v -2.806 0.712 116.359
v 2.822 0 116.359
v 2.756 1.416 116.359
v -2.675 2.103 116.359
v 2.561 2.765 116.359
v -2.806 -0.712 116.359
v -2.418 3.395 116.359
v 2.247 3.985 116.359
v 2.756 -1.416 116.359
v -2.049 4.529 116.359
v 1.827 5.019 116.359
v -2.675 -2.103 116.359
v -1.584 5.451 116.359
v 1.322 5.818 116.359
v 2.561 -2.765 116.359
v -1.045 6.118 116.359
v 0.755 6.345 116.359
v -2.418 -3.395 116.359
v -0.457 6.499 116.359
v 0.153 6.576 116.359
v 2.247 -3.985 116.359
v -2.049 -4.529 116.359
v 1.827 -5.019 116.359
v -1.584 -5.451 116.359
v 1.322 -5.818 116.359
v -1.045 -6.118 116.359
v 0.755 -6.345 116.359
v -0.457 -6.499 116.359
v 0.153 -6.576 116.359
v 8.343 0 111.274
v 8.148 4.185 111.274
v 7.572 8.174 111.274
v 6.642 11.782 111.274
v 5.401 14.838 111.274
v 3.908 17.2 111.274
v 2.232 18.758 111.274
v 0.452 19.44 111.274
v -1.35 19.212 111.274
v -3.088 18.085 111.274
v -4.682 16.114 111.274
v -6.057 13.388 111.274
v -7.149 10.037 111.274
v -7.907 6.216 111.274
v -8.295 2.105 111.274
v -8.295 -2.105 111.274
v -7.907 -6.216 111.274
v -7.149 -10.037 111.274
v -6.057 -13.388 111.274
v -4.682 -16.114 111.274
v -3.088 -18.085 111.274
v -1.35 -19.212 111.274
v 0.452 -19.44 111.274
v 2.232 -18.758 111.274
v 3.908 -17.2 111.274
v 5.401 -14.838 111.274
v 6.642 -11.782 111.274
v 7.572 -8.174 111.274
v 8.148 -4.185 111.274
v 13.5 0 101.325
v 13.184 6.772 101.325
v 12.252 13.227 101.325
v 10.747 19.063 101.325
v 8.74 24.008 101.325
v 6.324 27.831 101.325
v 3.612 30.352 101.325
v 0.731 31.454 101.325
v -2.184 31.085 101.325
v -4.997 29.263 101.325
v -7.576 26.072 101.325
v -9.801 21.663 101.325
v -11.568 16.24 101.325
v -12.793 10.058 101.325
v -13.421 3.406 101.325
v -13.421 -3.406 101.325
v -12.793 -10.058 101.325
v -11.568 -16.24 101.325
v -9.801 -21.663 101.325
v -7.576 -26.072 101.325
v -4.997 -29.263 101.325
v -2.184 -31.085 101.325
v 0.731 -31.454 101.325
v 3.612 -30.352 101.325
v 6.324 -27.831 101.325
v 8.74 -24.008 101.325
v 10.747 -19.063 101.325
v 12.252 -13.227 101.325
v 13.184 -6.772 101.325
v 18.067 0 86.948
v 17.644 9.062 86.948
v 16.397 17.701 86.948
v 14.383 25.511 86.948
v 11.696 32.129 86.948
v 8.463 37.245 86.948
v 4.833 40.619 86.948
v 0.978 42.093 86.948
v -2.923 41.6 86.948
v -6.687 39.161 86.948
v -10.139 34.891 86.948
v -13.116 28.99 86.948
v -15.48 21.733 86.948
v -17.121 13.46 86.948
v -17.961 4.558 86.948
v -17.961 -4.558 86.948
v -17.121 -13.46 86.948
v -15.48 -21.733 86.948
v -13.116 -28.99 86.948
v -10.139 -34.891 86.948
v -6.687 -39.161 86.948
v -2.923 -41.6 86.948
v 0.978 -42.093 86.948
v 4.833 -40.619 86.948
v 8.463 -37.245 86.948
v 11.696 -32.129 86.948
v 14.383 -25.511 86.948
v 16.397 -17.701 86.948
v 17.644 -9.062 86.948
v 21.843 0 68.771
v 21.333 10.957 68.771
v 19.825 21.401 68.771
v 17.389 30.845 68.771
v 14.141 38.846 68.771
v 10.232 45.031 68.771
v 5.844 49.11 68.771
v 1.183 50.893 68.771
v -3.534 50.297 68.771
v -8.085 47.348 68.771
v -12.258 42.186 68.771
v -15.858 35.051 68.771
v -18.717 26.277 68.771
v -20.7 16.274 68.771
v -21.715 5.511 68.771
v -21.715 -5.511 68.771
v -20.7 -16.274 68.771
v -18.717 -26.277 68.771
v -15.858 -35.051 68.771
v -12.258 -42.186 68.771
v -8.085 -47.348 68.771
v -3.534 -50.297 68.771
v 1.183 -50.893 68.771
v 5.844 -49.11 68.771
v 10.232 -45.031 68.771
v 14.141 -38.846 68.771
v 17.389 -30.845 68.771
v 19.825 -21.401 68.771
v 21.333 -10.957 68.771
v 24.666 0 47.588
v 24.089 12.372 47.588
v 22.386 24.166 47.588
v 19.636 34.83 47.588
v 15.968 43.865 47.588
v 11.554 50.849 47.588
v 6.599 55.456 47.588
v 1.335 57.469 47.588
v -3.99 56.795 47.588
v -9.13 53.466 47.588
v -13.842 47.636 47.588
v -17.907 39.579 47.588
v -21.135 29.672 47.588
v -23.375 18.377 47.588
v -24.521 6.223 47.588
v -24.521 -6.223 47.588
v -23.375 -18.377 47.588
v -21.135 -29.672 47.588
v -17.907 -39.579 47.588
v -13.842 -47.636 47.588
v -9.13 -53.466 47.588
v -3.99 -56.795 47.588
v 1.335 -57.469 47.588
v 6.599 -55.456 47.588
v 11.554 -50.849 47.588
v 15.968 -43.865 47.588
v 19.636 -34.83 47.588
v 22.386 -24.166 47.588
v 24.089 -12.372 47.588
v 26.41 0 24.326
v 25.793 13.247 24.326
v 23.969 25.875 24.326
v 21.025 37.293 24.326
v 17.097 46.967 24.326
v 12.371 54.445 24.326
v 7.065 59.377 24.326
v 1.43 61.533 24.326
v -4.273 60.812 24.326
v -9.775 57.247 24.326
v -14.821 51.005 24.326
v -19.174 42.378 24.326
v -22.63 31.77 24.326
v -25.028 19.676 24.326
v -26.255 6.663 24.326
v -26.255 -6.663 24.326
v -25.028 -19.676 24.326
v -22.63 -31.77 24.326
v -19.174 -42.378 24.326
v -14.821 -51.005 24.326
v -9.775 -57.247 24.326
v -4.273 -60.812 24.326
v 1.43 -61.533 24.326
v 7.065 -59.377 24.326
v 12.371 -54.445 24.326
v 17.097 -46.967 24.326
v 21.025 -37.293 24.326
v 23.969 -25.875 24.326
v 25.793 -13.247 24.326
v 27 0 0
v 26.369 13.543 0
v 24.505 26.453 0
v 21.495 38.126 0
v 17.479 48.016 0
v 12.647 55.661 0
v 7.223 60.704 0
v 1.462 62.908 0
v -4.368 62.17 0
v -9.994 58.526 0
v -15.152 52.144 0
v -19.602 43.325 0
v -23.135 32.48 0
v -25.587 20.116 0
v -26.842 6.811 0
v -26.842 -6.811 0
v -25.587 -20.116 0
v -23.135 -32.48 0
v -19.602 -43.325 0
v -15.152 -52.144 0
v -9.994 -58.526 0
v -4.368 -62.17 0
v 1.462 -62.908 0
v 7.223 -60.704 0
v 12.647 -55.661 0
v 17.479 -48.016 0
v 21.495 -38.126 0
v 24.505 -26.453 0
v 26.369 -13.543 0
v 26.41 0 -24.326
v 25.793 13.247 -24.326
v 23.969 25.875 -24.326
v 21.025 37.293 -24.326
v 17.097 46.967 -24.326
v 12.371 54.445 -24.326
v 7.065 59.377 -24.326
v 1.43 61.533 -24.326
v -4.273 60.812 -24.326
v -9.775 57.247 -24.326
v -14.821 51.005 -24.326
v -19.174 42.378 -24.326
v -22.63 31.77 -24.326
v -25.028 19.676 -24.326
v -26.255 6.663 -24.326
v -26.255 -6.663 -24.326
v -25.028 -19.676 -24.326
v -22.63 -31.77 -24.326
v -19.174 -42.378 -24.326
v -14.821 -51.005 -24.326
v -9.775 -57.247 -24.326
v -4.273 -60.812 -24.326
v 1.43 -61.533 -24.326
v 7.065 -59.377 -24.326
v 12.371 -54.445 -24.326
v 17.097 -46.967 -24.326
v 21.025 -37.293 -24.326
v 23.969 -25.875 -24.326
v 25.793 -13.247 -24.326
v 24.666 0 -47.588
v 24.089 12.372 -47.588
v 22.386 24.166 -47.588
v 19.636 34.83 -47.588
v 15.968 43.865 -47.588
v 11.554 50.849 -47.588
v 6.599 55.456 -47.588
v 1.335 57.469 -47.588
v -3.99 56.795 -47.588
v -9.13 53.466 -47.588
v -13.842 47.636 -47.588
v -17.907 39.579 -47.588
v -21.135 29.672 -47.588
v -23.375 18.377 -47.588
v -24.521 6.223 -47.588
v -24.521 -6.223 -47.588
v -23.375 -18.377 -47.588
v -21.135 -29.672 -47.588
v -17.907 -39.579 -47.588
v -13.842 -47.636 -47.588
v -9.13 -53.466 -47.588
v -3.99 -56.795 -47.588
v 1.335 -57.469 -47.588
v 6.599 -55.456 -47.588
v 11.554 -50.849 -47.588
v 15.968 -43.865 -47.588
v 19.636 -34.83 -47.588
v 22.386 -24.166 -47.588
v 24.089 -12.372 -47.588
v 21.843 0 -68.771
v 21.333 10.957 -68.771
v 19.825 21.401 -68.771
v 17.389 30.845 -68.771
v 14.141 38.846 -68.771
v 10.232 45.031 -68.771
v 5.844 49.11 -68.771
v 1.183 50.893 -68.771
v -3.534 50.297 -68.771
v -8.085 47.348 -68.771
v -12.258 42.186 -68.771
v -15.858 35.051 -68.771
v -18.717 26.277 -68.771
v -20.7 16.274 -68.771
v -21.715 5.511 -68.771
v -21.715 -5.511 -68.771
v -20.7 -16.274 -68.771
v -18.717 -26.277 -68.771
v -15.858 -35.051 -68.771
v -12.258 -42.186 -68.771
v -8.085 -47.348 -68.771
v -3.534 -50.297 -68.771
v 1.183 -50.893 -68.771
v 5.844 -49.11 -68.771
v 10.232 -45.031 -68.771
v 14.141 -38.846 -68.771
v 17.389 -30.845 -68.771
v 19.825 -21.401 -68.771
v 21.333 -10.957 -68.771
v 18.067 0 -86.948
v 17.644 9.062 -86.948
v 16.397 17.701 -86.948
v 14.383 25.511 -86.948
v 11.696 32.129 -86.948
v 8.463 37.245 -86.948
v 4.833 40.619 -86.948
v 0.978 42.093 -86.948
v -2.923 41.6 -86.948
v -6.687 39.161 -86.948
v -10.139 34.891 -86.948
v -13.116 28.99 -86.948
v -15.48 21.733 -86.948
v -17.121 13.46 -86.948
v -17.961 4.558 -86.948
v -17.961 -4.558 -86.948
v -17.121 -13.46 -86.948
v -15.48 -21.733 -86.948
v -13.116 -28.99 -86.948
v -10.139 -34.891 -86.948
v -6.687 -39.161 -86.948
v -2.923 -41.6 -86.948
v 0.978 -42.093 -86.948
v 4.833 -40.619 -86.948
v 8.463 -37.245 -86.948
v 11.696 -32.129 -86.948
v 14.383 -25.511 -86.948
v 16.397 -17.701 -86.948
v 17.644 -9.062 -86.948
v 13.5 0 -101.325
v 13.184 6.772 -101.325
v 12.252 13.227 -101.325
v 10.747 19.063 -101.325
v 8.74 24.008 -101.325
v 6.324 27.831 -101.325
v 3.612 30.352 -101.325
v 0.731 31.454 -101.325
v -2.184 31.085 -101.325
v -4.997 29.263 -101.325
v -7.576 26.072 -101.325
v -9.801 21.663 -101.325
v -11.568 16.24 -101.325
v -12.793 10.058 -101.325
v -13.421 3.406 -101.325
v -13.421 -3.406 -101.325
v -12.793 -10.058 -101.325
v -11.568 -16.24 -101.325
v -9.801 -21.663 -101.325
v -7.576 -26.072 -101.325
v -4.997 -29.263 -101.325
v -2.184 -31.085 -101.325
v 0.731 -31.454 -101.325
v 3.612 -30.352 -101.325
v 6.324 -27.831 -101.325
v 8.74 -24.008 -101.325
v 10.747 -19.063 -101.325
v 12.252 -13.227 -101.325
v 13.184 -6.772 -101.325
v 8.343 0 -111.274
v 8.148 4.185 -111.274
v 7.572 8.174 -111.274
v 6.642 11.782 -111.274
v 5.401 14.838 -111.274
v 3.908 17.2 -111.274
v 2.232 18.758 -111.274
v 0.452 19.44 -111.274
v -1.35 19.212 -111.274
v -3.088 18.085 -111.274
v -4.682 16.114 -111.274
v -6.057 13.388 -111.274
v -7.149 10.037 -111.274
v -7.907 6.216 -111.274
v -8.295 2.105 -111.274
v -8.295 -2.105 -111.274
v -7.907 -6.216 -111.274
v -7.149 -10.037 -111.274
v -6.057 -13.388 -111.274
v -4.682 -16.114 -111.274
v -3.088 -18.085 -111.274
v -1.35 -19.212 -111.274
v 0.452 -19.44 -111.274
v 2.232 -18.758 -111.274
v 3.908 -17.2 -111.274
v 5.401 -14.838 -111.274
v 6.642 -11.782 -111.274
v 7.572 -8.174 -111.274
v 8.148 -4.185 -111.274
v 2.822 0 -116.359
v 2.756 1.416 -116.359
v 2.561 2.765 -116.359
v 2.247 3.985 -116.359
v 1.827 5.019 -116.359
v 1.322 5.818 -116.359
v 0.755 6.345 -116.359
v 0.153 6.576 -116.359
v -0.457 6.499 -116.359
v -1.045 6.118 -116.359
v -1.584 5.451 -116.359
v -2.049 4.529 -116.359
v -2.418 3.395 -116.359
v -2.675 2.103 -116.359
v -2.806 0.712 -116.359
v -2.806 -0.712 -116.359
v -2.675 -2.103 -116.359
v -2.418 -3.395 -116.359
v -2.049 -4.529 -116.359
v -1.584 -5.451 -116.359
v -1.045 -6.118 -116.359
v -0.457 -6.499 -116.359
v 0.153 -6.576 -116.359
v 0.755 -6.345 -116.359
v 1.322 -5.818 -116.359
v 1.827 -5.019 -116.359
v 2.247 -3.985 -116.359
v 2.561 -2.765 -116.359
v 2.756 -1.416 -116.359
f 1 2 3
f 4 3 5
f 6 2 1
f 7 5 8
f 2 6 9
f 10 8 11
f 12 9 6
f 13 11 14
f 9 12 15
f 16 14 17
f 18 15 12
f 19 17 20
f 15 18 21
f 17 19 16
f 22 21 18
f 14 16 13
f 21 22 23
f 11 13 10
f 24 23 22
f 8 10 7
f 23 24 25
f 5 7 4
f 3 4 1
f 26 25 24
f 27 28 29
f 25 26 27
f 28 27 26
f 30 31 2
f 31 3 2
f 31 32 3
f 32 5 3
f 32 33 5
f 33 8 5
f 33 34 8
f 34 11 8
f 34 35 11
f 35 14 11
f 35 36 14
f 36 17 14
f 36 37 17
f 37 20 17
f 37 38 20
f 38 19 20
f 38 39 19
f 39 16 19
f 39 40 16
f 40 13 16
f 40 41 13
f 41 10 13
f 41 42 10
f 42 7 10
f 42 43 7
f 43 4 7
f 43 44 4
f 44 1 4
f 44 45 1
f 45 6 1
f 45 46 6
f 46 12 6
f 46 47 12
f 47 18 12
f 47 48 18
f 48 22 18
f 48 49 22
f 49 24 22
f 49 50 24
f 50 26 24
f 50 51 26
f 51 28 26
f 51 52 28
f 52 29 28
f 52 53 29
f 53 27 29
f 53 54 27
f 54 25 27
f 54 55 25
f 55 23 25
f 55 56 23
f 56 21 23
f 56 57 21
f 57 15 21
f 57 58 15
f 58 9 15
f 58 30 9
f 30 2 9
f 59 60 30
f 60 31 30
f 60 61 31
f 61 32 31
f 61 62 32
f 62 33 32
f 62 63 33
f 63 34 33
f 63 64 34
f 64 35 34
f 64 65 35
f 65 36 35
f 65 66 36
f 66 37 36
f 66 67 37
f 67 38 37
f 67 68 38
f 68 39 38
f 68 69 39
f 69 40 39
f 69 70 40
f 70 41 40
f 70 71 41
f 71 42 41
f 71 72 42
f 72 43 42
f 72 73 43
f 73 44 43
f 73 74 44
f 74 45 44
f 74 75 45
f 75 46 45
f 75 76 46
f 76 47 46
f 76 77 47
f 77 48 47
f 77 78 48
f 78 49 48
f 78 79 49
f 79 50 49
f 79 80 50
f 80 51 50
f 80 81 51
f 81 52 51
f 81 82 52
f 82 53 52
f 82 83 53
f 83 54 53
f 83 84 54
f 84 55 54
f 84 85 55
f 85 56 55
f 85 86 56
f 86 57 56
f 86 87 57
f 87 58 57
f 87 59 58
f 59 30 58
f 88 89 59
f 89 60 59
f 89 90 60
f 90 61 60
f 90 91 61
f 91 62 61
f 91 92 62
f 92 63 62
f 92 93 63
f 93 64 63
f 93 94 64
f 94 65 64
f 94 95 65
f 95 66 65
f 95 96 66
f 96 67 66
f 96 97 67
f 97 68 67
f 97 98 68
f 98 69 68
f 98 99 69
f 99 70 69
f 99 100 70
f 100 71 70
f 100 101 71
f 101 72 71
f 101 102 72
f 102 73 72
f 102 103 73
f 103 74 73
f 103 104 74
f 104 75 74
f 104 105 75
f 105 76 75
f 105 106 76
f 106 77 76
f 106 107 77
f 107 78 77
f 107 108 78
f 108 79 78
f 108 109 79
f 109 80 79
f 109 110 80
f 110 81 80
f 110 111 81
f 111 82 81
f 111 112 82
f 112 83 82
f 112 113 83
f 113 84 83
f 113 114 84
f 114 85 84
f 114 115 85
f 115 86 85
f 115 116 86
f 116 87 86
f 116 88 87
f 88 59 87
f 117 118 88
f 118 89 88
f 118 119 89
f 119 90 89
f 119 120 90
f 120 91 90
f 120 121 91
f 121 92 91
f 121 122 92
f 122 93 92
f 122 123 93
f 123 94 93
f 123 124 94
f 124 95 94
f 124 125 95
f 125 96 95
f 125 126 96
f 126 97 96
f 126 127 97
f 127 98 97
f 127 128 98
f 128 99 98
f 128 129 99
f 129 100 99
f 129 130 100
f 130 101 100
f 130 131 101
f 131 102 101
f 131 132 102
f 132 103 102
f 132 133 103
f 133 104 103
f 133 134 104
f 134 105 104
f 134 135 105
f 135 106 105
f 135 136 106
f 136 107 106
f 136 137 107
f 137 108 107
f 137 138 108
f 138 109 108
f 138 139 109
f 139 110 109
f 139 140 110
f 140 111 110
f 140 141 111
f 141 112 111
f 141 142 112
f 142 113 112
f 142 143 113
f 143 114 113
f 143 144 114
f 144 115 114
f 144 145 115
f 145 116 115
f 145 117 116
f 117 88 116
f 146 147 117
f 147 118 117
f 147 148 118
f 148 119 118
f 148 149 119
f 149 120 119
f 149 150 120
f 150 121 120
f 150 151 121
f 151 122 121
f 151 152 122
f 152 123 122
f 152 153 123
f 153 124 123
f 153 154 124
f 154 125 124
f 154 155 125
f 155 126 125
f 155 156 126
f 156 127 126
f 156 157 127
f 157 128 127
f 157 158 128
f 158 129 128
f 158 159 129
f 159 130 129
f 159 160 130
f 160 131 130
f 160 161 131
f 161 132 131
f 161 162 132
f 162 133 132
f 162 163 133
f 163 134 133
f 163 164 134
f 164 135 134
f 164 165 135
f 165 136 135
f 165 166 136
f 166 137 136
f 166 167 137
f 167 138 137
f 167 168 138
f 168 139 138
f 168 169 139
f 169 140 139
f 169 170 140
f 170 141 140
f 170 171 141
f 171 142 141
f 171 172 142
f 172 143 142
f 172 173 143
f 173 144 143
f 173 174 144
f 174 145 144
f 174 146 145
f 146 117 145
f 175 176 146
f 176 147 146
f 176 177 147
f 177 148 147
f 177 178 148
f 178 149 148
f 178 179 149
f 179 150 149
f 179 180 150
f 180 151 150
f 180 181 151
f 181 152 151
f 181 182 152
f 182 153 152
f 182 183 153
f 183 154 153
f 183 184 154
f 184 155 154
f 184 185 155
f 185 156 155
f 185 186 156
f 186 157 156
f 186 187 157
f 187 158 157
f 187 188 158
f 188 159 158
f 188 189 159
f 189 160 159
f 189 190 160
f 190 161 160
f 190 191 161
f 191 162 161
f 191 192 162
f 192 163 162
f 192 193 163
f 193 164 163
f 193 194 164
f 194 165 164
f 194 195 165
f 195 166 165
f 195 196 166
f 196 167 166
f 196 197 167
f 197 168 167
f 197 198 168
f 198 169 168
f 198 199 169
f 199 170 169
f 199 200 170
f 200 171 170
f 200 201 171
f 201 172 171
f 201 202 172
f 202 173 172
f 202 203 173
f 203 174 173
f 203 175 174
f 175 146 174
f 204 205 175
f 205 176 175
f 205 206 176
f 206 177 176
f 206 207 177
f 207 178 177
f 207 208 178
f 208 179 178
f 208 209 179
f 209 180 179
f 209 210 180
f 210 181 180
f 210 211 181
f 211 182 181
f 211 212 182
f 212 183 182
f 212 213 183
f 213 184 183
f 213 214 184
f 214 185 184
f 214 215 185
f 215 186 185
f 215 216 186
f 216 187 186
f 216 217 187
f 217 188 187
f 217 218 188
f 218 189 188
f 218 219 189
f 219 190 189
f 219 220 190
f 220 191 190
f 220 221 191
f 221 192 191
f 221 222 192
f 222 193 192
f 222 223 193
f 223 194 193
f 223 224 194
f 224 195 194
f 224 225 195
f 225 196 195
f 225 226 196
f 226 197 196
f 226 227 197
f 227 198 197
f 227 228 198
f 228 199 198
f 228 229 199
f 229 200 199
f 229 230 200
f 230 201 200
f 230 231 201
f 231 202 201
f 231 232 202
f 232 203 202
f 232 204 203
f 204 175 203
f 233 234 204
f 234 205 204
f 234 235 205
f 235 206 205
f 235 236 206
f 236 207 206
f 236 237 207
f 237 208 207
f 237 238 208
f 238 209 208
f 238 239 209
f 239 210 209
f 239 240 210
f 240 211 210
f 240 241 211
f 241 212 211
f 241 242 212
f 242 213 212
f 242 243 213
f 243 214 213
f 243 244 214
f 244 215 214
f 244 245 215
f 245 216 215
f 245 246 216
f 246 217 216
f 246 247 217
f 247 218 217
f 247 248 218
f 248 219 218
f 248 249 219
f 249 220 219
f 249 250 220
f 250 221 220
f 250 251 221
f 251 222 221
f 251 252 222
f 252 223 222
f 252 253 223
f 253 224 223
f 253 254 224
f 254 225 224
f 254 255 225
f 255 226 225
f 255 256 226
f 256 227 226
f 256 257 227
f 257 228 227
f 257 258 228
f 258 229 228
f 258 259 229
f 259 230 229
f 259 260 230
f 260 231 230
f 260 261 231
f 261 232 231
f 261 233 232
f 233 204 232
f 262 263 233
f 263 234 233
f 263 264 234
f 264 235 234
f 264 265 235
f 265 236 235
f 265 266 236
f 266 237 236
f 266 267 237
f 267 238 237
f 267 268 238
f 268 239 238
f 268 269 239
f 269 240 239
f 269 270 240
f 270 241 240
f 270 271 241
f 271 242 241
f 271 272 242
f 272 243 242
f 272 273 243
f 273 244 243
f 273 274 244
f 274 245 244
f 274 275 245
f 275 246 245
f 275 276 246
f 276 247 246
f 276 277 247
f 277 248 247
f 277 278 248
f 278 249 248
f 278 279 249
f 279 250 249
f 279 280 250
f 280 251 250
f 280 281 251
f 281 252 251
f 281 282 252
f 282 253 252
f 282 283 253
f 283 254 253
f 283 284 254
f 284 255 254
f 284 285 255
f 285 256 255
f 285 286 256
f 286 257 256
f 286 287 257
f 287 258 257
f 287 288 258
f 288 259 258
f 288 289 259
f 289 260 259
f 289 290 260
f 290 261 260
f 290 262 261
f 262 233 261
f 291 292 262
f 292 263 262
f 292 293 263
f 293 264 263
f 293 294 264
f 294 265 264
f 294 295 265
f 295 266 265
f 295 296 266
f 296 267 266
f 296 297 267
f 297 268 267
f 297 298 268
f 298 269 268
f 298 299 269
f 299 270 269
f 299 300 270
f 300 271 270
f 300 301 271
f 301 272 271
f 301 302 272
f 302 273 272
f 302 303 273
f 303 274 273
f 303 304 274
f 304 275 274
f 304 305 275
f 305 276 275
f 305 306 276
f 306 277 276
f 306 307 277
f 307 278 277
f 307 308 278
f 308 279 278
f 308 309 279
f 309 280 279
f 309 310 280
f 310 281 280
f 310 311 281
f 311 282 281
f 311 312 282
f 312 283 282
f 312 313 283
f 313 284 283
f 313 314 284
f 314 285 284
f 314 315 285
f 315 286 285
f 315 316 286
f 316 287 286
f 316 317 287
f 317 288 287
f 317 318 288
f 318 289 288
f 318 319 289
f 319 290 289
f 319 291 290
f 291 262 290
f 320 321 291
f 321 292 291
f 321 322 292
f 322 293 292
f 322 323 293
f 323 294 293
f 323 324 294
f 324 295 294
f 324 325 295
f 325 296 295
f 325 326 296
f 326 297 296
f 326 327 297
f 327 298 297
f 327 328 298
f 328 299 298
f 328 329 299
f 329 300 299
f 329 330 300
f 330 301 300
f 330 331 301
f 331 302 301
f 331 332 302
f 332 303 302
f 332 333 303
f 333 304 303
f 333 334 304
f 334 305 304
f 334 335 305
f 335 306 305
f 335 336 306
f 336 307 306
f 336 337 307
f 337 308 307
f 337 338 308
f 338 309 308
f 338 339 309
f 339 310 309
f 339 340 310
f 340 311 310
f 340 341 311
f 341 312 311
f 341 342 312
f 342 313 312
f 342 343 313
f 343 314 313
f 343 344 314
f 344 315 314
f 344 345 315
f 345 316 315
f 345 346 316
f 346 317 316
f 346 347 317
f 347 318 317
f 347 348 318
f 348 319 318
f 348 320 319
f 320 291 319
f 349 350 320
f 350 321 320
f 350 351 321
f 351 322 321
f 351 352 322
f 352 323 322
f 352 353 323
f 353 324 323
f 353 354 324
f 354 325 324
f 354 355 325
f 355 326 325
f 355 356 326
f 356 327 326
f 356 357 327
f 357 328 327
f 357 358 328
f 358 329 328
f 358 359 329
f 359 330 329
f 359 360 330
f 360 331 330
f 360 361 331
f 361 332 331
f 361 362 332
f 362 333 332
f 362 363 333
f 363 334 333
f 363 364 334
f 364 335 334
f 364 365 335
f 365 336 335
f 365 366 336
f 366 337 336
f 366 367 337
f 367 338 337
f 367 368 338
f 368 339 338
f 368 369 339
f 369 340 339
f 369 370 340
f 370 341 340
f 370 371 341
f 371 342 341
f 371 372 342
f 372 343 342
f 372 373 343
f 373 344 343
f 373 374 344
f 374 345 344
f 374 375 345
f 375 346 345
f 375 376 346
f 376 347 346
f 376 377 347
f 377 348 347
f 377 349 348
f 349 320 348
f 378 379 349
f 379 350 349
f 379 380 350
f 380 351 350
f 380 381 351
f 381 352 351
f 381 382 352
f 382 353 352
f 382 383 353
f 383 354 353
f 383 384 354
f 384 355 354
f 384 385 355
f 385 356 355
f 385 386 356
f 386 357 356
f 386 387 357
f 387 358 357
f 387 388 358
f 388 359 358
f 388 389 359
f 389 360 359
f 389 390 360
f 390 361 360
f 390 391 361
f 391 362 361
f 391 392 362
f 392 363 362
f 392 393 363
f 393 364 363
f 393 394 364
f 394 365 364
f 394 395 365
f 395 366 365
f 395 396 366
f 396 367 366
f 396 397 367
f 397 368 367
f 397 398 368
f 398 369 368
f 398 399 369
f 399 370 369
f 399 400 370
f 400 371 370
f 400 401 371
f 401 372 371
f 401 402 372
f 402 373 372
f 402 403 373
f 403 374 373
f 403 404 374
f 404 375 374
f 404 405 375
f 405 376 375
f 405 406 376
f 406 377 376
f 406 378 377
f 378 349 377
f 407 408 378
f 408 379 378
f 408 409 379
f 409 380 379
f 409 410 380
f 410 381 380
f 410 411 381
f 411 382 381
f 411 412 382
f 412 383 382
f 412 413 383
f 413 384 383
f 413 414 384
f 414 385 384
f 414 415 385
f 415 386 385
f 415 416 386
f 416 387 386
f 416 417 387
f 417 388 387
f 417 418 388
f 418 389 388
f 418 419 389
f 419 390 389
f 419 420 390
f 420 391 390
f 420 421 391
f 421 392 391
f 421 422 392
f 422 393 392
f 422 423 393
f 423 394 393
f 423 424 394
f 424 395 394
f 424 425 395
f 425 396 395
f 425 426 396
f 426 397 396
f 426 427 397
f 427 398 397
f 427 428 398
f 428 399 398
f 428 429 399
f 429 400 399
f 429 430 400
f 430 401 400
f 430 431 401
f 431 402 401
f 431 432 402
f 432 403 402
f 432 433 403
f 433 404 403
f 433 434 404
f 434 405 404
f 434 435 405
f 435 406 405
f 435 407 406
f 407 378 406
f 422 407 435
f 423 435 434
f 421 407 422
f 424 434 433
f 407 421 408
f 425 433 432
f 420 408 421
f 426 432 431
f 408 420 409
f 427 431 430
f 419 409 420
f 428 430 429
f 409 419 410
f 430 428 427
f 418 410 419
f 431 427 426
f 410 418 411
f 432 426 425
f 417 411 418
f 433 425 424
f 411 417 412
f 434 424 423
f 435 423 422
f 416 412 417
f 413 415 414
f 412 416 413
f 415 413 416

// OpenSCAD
// Generated by SolidPython 1.0.1 on 2020-07-29 00:46:45


scale(v = [3, 7, 13]) {
	sphere(r = 9);
}
/***********************************************
*********      SolidPython code:      **********
************************************************
 
# import packages: SolidPython
from solid import *
from solid.utils import *
from itertools import chain, combinations, permutations


class Resize:

    def __init__(self, scad_file):
        self.scad_file = scad_file
        #self.scad_file = import_scad(scad_file)
        # cone/cylinder param:
        self.r1 = 0
        self.r2 = 0
        self.h = 0
        # rectangular prism param:
        self.w = 0
        self.l = 0
        # ellipse param:
        self.r = 0

    # import OpenScad code (file name corresponds to shape)


    # classify shape + parameters
    def assign(self, param1, param2, param3):
        if self.scad_file == 'cone.scad':
            self.r1 = param1
            self.r2 = param2
            self.h = param3
        elif self.scad_file == 'cylinder.scad':
            self.r1 = param1
            self.r2 = param2
            self.h = param3
        elif self.scad_file == 'rectangularPrism.scad':
            self.h = param1
            self.l = param2
            self.w = param3
        else:
            self.r = param1
            self.h = param2

    # resize parameters
    def iterate(self):
        x = range(3, 20, 2)
        i = 1
        if self.scad_file == 'cone.scad':
            tempList = list(permutations(x, 2))
            for temp in tempList:
                param1 = temp[0]
                param2 = temp[1]
                filepath = 'produced_scad_files/' + 'cone' + str(param1) + '_' + str(param2) + '_' + '.scad'
                scad_render_to_file(cylinder(h=param1, r1=param2, r2=0), filepath)

        elif self.scad_file == 'cylinder.scad':
            tempList = list(permutations(x, 3))
            for temp in tempList:
                param1 = temp[0]
                param2 = temp[1]
                filepath = 'produced_scad_files/' + 'cylinder' + str(param1) + '_' + str(param2) + '_' + '.scad'
                scad_render_to_file(cylinder(h=param1, r1=param2, r2=param2), filepath)

        elif self.scad_file == 'rectangularPrism.scad':
            tempList = list(permutations(x, 3))
            for temp in tempList:
                param1 = temp[0]
                param2 = temp[1]
                param3 = temp[2]
                filepath = 'produced_scad_files/' + 'rectangularPrism' + str(param1) + '_' + str(param2) + '_' + str(
                    param3) + '.scad'
                scad_render_to_file(cube(size=(param1, param2, param3)), filepath)

        elif self.scad_file == 'ellipse.scad':
            tempList = list(permutations(x, 4))
            for temp in tempList:
                param1 = temp[0]
                param2 = temp[1]
                param3 = temp[2]
                param4 = temp[3]
                filepath = 'produced_scad_files/' + 'ellipse' + str(param1) + '_' + str(param2) + '_' + str(param3) + '_' + str(param4) + '.scad'
                scad_render_to_file(scale([param1, param2, param3])(sphere(r=param4)), filepath)

    def render_to_scadfile(self):
        scad_render_to_file(scad, 'example.scad') 
 
************************************************/
